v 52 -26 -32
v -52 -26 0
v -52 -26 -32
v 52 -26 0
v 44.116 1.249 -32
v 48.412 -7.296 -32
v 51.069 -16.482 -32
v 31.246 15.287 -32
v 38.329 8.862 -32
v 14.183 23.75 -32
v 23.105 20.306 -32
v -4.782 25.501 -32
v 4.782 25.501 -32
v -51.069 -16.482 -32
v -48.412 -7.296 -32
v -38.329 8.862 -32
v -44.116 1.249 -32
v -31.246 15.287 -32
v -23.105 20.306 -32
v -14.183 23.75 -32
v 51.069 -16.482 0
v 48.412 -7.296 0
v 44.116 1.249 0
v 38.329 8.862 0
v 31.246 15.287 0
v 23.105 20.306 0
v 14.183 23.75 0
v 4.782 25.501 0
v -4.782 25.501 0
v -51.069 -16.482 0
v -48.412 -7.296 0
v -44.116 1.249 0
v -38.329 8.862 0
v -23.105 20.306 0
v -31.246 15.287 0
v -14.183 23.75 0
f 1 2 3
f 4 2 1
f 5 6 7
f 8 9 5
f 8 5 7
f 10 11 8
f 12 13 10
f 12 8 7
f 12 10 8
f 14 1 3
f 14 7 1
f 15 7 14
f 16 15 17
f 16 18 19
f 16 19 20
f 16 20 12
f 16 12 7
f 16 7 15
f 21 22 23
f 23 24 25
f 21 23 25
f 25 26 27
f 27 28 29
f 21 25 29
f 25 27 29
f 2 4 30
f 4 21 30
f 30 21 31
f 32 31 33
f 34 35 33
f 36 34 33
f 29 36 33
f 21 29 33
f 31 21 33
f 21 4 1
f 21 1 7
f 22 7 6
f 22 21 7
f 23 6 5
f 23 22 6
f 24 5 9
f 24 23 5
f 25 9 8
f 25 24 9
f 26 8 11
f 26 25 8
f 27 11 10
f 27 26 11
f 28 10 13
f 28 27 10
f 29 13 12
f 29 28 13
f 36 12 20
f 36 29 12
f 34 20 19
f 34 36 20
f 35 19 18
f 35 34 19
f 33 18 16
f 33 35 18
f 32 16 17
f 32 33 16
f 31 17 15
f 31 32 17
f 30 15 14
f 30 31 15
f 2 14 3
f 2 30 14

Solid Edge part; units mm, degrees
sketch "Sketch1" plane through (0, 0, 0) normal (0, 0, 1) x (1, 0, 0)
  arc A0 (-52, -26) -> (52, -26) centre (0, -26.2795) cw
  line L0 (-52, -26) -> (52, -26)
extrude "Protrusion1" add sketch "Sketch1" against normal blind 32
sketch "Sketch2" plane through (0, -0.1394, 0) normal (0, 0, 1) x (1, 0, 0)
  line L0 (-55.74, -28.2911) -> (55.74, -28.2911)
  line L1 (55.74, -28.2911) -> (55.74, 28.5699)
  line L2 (55.74, 28.5699) -> (-55.74, 28.5699)
  line L3 (-55.74, 28.5699) -> (-55.74, -28.2911)
extrude "Recorte_Extrudado_2" cut sketch "Sketch2" against normal blind 16.3
sketch "Sketch3" plane through (0, -0.1394, -16.3) normal (0, 0, 1) x (1, 0, 0)
  arc A0 (-52, -25.8606) -> (52, -25.8606) centre (0, -26.1401) cw
  line L0 (-52, -25.8606) -> (52, -25.8606)
extrude "Protrusão_Extrudada_6" add sketch "Sketch3" along normal blind 16.3
